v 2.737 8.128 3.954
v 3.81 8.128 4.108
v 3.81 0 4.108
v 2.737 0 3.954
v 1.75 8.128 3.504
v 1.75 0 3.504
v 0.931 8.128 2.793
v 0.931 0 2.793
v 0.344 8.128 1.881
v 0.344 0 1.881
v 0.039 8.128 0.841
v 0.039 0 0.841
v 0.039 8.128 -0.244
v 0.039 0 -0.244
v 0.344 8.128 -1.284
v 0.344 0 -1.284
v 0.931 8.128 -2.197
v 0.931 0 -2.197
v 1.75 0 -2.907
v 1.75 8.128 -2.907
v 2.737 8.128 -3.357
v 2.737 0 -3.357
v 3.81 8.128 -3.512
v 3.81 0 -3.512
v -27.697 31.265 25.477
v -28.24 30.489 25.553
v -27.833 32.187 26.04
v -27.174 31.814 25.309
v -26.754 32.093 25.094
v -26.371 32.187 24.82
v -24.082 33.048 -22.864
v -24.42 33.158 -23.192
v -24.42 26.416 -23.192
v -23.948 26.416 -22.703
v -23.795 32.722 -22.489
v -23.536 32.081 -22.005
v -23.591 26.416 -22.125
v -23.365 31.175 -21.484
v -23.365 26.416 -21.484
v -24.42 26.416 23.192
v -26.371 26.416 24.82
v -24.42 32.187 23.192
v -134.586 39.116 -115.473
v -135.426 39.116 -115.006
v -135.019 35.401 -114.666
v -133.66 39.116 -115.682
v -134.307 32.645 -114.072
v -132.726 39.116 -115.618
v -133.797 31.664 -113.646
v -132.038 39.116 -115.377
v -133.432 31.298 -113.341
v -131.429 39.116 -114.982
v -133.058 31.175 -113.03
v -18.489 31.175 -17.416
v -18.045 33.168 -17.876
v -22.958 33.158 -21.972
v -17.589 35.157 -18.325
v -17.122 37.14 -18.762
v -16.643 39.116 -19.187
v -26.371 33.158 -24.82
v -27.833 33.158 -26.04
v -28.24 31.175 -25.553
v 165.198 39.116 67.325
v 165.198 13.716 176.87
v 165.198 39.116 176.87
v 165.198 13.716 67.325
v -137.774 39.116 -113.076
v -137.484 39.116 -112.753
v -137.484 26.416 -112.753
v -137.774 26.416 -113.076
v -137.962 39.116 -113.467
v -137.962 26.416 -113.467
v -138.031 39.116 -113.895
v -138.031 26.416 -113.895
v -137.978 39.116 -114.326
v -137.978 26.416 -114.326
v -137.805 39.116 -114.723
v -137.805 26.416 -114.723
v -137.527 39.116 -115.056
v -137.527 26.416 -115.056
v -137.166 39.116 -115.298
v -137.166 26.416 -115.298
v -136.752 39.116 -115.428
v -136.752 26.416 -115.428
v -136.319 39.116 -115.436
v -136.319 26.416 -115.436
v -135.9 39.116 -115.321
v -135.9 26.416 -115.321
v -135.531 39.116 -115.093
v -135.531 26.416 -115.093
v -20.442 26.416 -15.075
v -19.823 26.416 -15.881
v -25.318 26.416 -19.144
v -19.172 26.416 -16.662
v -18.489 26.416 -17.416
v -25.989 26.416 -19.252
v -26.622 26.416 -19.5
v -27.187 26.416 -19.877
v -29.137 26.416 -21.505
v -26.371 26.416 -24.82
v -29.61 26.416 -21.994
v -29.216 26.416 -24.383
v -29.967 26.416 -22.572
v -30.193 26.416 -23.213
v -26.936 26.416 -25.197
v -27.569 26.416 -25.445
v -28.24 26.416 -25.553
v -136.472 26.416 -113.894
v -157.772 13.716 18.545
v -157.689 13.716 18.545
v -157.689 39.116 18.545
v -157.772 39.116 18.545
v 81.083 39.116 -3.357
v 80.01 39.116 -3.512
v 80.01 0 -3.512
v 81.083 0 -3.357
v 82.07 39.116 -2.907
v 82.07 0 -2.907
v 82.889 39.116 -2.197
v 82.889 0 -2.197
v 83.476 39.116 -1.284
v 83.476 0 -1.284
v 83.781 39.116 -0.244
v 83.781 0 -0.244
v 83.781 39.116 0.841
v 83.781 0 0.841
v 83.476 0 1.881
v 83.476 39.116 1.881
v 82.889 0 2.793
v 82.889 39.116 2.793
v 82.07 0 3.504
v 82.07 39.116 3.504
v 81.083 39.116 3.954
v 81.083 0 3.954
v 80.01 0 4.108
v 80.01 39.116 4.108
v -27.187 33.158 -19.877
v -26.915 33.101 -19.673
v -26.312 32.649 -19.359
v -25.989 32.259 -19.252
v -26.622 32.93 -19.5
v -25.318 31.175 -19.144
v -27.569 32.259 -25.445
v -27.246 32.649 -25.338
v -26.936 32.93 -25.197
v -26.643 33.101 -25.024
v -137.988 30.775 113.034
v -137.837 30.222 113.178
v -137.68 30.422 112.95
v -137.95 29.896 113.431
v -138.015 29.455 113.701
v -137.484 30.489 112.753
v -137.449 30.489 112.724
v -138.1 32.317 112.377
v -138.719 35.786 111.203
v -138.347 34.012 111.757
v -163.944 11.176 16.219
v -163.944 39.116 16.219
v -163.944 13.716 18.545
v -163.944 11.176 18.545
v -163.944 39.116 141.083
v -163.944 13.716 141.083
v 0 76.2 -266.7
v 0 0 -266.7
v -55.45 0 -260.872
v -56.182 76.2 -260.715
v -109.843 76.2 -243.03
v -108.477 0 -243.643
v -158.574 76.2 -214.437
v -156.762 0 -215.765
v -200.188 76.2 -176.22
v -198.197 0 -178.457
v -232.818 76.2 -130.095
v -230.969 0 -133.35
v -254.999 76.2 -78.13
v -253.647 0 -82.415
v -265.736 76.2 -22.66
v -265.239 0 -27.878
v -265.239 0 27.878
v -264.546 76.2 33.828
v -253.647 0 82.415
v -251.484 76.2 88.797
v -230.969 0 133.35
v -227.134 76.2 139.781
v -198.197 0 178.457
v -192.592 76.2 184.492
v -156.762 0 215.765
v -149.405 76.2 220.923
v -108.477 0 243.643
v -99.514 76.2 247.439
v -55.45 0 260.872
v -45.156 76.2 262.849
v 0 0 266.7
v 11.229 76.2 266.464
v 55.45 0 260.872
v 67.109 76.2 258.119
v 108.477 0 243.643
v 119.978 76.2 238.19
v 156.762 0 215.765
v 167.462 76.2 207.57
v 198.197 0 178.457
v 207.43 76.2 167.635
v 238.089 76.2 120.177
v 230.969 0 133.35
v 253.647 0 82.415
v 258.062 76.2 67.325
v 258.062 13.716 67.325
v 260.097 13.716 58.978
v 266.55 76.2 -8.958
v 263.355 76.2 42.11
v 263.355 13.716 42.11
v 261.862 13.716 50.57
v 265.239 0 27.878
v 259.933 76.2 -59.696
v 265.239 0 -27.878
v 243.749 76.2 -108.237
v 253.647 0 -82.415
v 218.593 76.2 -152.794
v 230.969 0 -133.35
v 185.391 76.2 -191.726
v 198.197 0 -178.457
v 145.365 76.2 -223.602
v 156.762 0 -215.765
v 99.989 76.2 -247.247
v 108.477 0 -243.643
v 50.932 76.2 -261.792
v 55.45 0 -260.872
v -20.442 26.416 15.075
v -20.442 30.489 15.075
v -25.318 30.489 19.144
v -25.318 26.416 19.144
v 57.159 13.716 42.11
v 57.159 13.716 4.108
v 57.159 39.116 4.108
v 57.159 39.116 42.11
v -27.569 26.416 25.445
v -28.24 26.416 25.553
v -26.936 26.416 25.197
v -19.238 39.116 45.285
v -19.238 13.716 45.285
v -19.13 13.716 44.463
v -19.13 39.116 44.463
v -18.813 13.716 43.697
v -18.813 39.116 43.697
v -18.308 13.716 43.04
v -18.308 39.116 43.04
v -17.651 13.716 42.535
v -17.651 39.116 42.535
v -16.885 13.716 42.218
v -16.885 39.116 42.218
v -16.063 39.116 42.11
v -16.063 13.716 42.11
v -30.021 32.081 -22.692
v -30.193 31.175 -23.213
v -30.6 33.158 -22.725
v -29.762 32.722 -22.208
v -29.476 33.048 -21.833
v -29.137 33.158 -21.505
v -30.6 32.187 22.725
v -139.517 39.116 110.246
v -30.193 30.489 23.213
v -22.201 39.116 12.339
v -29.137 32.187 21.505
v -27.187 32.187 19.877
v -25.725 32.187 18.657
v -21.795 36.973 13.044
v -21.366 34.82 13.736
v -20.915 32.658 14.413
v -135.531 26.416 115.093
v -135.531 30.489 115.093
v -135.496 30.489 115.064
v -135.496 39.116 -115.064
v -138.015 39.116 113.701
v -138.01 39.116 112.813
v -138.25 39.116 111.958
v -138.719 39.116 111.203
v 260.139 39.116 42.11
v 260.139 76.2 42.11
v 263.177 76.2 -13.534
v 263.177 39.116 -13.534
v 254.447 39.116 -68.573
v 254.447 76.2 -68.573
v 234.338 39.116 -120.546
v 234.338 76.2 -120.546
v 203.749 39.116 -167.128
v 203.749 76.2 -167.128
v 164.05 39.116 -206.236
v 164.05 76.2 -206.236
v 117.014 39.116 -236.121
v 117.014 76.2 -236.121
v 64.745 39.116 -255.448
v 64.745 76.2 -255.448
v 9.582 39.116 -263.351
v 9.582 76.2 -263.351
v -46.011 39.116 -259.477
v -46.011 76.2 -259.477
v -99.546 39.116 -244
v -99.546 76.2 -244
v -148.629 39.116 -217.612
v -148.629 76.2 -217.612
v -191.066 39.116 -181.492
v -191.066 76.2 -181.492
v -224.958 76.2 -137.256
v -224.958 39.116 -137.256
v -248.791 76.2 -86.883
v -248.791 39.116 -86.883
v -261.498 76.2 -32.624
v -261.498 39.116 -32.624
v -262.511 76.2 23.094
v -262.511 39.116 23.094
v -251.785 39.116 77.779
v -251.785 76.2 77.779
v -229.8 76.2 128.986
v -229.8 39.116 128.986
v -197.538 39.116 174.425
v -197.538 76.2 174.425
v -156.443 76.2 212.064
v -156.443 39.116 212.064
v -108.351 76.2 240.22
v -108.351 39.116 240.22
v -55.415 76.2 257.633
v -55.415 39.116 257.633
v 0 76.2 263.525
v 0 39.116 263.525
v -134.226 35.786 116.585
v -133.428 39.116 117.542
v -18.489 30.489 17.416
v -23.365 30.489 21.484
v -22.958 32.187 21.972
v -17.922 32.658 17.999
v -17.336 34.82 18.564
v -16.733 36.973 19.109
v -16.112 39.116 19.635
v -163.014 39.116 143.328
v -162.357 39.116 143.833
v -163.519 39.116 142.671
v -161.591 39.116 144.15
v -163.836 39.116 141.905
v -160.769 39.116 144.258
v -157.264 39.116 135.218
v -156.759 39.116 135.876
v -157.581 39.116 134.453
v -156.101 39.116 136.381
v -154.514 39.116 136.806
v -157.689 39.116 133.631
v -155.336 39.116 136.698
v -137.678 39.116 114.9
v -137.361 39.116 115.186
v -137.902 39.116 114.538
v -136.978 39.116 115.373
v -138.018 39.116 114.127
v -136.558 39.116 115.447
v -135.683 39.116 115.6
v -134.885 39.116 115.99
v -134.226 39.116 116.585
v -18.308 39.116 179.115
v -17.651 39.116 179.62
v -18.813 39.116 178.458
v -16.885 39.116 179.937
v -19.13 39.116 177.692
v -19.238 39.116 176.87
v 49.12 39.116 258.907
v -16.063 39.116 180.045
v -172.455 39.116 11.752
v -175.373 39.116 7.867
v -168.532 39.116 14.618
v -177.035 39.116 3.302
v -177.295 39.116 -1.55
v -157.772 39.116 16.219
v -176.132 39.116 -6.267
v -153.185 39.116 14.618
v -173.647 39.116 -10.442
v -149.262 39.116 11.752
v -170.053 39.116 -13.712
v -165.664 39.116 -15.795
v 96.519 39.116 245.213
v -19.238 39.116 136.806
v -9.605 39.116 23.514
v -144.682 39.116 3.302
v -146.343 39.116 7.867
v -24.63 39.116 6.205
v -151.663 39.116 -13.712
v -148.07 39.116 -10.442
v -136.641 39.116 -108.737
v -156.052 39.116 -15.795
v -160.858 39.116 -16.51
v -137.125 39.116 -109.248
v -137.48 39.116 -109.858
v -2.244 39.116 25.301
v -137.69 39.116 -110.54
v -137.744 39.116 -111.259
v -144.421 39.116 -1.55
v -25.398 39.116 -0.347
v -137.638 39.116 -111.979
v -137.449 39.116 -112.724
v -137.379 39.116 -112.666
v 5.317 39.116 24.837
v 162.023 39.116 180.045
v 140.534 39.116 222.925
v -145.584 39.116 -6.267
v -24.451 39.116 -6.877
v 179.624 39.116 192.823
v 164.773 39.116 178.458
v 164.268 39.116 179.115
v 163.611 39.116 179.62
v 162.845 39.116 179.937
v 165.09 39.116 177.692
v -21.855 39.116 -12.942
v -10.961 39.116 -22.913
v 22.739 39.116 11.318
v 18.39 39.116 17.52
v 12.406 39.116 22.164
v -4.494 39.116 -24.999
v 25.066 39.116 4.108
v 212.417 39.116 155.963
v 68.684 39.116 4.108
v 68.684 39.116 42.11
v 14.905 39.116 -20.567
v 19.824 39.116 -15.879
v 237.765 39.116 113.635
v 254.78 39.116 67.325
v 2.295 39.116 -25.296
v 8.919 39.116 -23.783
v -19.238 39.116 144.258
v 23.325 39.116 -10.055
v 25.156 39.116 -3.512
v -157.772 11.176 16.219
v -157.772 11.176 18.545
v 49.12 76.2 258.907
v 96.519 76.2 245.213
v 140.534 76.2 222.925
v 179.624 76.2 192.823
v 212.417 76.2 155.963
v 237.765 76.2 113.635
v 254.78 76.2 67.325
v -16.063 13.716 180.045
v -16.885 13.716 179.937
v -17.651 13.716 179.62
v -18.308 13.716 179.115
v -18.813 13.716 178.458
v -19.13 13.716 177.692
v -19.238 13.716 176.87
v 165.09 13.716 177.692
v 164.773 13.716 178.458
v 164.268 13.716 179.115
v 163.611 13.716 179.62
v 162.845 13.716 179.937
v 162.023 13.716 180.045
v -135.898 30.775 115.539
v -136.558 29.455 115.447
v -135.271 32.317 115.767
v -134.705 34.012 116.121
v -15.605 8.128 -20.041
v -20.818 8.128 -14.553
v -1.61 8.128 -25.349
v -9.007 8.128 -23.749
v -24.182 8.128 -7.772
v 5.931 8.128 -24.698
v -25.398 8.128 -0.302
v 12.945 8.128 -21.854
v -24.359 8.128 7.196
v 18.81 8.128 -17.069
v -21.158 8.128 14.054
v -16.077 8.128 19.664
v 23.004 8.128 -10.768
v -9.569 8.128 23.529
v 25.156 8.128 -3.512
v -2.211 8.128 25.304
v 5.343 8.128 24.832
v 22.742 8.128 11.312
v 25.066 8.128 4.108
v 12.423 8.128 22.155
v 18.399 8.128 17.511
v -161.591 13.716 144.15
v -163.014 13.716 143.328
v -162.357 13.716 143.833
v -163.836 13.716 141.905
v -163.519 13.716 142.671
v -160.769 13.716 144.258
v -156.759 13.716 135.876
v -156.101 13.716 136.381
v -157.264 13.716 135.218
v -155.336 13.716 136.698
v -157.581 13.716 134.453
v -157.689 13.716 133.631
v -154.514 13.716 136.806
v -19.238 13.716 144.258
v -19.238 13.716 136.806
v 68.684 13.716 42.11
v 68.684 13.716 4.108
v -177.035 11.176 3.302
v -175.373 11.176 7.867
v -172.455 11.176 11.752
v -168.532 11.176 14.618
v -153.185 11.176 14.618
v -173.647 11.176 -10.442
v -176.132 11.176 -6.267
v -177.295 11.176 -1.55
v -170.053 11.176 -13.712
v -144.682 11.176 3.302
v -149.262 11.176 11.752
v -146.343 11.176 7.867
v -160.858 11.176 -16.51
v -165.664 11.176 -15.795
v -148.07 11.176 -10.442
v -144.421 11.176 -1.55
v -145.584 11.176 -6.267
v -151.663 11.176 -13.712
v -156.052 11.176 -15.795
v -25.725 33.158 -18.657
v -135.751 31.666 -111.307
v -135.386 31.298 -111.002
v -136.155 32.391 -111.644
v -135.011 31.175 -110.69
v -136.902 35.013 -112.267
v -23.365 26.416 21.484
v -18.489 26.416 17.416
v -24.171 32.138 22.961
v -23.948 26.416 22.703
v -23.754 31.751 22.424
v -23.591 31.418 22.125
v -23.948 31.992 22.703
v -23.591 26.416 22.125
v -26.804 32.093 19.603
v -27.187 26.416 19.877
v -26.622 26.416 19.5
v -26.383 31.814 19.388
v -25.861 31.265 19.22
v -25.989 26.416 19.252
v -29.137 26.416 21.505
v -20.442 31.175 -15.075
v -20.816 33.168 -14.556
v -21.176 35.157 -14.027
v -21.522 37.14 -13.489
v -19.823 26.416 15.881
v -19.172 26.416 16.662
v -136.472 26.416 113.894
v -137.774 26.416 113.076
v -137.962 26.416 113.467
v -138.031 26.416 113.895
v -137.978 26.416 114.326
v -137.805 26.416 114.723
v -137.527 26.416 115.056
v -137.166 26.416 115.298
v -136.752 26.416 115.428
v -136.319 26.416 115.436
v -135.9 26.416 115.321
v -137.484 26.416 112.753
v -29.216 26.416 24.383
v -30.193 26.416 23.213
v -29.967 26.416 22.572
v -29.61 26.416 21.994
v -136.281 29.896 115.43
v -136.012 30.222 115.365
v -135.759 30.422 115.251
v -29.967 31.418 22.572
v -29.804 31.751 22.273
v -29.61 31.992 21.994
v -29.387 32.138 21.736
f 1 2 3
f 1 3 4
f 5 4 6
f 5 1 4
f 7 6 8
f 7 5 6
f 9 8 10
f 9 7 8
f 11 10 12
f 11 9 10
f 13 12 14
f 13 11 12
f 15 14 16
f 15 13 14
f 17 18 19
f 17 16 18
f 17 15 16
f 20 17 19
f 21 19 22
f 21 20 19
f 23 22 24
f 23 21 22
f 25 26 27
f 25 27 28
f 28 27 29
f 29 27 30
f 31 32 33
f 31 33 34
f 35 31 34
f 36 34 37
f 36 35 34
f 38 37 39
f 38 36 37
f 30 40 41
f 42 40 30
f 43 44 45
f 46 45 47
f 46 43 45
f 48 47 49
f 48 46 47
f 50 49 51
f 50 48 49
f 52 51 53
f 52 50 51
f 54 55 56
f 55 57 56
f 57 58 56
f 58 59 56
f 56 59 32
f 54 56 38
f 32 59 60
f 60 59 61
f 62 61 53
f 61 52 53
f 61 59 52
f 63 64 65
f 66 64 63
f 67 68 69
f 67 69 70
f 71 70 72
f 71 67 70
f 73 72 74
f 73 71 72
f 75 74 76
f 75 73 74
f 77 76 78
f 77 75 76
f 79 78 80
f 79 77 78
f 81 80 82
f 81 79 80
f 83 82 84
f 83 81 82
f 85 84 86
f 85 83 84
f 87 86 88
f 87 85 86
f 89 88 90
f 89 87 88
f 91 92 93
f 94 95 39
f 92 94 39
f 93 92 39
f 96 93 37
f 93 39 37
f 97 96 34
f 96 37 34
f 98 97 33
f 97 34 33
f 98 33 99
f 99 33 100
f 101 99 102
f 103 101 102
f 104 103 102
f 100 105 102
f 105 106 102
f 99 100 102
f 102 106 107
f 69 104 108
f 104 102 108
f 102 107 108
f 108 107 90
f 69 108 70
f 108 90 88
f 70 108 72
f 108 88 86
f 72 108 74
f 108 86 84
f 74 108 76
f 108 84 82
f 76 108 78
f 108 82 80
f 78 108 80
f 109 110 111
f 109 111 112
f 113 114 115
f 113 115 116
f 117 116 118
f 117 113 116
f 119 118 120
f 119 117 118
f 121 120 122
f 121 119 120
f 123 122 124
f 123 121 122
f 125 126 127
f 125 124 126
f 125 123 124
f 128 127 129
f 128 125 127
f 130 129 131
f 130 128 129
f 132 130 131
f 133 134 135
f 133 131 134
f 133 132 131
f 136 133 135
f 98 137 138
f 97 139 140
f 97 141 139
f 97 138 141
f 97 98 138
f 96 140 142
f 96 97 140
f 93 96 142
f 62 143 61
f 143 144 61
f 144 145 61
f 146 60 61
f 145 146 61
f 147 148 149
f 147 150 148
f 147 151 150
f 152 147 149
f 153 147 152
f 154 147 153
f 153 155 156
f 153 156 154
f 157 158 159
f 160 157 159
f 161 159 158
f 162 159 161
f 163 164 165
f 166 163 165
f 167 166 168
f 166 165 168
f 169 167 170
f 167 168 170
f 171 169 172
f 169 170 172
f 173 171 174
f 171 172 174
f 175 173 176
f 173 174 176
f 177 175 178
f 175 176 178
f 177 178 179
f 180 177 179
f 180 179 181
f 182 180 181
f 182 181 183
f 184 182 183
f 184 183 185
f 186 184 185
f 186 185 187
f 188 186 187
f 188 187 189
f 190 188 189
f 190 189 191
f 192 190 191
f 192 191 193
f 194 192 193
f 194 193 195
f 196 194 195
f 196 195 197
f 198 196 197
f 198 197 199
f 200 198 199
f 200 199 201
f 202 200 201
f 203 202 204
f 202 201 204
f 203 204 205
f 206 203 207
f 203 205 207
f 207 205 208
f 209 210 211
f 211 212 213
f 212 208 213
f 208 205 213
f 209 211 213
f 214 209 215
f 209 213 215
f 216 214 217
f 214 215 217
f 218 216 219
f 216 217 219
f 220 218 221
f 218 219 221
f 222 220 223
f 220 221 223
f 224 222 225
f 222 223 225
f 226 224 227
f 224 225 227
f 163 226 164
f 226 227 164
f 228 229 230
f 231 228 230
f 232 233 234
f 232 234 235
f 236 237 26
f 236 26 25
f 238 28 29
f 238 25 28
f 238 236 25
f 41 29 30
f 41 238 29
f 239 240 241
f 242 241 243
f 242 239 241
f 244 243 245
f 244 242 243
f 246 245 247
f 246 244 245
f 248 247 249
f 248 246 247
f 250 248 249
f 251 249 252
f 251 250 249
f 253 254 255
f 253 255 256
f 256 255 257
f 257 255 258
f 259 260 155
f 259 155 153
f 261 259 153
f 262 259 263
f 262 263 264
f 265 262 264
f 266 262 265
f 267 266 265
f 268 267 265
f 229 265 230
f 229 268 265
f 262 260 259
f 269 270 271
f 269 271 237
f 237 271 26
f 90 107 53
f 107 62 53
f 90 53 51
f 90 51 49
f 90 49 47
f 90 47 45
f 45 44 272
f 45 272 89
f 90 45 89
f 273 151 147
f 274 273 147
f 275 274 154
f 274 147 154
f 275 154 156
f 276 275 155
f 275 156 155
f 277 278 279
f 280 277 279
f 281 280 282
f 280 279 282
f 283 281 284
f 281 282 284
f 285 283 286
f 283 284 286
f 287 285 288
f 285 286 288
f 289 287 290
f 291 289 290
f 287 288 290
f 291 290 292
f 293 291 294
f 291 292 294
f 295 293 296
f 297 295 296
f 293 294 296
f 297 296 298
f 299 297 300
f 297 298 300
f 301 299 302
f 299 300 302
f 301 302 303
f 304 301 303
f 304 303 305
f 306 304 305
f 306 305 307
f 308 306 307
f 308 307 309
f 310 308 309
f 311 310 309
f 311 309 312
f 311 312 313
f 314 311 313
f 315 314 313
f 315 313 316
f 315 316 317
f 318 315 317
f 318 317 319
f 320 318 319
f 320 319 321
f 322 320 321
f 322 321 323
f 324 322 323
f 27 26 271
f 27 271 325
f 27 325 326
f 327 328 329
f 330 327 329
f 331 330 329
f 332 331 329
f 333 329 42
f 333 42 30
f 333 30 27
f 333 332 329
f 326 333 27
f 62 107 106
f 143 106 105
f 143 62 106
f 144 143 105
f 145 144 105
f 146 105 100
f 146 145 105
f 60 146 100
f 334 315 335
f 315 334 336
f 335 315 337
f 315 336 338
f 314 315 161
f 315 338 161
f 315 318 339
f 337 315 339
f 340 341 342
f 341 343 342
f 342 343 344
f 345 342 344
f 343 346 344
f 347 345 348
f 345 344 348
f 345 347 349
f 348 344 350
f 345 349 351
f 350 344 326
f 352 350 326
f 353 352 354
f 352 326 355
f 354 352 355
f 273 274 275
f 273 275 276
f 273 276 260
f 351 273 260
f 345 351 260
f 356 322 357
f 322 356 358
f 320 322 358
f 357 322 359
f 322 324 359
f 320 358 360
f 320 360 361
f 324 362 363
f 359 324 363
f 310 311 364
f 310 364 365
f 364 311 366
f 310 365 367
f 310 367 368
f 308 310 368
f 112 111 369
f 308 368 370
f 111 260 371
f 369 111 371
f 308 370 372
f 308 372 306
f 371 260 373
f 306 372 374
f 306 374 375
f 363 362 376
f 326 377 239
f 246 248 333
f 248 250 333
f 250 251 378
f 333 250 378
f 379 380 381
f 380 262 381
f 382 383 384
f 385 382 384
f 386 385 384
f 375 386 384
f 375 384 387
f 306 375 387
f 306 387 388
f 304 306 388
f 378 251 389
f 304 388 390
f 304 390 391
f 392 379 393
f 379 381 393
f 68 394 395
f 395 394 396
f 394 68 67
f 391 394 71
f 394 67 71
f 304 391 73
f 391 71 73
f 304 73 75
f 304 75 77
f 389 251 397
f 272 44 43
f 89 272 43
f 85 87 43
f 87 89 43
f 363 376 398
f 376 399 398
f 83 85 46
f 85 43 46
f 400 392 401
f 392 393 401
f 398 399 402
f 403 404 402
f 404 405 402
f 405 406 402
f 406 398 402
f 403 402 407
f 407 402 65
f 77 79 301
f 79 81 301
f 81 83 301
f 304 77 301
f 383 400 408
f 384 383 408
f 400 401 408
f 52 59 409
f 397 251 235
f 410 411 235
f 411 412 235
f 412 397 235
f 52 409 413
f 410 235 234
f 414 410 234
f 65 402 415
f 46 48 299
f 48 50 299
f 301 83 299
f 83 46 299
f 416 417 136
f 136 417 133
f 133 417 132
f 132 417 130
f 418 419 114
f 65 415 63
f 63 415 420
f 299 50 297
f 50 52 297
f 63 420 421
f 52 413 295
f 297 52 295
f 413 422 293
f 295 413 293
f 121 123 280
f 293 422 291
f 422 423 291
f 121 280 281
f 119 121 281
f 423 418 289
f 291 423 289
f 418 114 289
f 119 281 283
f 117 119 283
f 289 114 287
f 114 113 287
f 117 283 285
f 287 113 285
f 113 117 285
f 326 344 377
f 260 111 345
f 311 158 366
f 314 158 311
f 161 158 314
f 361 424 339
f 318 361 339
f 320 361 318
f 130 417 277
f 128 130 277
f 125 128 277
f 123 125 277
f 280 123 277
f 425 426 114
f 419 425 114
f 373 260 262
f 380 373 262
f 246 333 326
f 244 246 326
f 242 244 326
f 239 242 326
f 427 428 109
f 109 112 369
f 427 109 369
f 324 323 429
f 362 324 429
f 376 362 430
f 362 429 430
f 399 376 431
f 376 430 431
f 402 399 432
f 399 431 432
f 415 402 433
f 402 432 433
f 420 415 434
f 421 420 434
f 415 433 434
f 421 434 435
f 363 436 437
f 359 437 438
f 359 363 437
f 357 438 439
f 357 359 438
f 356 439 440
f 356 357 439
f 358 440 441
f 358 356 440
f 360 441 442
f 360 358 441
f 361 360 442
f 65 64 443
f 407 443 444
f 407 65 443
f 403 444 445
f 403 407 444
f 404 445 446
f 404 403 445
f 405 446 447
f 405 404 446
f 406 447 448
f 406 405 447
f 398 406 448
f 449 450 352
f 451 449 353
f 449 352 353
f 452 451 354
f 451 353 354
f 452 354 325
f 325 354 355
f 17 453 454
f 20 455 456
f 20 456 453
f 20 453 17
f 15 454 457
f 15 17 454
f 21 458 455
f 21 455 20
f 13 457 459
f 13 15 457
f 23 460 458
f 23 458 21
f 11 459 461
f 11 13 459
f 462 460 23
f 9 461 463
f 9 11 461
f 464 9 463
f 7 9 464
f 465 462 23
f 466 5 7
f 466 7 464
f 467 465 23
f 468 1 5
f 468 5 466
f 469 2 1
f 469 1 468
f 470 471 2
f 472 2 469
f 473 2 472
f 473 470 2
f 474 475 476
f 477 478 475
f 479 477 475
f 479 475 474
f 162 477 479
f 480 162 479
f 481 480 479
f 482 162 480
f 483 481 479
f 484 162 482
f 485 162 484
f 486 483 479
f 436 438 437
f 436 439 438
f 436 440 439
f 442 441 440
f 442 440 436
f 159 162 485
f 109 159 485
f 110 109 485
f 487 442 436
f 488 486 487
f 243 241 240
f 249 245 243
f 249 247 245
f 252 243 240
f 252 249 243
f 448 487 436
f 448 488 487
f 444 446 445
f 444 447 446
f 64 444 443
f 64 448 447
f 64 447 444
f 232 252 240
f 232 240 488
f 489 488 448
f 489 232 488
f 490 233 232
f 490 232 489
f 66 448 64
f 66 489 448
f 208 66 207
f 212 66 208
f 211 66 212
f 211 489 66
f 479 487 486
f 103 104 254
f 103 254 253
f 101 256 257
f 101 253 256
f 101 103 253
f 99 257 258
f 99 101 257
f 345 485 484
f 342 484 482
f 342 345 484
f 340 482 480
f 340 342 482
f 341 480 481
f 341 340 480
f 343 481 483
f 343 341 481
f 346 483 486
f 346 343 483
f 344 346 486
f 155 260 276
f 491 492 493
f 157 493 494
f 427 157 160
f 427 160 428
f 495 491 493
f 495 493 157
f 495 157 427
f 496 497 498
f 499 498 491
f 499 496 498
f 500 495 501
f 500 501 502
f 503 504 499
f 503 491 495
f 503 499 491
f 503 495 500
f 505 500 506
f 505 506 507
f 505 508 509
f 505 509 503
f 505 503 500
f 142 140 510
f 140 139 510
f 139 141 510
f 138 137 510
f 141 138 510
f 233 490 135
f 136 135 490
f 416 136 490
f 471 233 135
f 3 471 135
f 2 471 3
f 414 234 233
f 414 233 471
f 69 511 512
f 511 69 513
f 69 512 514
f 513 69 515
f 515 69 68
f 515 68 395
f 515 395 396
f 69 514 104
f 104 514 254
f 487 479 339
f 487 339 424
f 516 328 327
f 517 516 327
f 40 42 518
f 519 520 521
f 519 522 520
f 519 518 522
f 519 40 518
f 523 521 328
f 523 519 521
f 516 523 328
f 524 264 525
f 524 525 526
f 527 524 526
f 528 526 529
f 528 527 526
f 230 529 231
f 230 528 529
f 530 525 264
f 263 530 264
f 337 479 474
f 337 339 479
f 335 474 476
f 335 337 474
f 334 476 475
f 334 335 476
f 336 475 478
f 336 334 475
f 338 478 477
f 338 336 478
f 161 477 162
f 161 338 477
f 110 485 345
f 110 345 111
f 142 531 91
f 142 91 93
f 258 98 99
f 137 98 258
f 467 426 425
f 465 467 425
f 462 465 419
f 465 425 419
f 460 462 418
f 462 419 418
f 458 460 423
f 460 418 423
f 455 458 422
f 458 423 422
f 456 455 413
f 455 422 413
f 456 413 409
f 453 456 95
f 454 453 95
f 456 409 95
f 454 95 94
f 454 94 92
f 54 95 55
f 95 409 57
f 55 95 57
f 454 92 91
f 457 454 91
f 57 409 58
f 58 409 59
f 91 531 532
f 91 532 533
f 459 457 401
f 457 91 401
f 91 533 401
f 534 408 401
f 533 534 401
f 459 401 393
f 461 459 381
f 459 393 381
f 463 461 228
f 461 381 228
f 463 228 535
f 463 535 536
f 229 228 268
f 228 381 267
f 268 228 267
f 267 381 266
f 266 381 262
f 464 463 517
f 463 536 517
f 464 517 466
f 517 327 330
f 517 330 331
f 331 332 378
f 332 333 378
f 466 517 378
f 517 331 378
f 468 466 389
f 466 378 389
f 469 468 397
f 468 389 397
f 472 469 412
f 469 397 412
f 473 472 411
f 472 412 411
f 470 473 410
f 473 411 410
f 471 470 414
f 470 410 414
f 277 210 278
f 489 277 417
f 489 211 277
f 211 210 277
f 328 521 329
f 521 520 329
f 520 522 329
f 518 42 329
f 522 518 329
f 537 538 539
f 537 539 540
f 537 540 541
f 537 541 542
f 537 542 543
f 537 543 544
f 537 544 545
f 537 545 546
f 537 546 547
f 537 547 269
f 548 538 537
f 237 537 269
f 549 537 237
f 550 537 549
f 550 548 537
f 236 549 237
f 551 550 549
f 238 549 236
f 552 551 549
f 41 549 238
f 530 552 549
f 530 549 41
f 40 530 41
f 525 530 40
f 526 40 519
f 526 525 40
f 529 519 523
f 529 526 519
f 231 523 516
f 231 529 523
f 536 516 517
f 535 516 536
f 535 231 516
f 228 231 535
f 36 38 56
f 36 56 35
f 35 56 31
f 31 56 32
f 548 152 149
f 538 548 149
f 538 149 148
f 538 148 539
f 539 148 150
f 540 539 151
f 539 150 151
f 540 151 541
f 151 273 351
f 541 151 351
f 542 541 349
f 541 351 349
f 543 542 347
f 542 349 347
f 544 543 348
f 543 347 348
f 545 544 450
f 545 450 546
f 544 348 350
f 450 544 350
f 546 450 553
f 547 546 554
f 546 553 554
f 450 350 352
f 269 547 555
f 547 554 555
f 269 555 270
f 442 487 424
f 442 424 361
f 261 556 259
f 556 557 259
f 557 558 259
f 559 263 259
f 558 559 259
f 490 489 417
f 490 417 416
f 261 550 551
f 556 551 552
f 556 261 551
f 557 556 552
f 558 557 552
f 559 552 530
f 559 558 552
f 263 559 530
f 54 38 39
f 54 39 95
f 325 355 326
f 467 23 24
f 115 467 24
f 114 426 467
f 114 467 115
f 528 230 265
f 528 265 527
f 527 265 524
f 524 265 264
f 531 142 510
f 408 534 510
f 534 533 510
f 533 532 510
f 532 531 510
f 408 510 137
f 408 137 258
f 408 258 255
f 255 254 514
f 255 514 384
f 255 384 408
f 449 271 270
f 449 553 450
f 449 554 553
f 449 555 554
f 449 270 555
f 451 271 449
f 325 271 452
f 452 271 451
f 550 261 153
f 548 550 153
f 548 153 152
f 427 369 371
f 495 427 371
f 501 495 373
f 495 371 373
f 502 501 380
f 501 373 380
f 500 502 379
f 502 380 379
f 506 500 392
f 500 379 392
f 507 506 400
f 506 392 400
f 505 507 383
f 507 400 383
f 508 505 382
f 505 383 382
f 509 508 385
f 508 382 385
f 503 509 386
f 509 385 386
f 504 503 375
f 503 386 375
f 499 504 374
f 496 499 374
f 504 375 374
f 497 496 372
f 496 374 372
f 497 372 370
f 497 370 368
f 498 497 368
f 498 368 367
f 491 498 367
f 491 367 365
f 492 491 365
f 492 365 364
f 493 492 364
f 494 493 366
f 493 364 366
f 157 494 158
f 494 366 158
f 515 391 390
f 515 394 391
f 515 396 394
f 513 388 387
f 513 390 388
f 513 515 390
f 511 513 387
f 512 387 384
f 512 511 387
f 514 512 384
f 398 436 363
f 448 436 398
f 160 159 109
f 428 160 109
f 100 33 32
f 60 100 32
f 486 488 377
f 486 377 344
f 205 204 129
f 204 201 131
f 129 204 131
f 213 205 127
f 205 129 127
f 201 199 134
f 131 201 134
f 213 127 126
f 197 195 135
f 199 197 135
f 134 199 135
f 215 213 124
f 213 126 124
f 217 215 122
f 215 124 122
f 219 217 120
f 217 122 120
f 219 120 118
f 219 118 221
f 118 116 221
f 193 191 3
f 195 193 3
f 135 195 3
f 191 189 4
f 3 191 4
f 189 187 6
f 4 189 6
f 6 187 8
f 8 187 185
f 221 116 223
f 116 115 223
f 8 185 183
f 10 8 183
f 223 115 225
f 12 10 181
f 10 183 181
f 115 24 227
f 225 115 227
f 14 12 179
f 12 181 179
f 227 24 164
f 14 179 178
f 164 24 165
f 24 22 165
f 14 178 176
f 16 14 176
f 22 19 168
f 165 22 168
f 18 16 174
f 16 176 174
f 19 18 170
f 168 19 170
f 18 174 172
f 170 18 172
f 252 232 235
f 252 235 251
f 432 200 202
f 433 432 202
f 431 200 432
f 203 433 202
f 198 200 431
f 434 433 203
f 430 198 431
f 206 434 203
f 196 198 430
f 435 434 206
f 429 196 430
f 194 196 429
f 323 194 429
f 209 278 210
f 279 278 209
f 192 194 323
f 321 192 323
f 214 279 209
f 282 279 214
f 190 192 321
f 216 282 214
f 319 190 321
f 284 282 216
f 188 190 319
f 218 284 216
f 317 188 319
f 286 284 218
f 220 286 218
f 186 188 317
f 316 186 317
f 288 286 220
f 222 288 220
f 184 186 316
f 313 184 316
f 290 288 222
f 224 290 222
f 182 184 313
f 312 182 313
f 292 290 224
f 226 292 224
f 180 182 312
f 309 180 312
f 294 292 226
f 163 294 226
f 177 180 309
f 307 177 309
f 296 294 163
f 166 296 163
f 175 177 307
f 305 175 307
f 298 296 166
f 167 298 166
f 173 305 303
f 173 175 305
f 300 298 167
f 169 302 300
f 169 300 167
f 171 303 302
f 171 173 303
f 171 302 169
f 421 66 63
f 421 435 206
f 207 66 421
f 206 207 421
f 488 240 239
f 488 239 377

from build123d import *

# Parameters (mm, degrees)
SKETCH1_R                = 266.7
BOSS_EXTRUDE1_DEPTH      = 76.2
SKETCH2_R                = 263.525
CUT_EXTRUDE1_DEPTH       = 37.084
SKETCH3_R                = 25.4
CUT_EXTRUDE2_DEPTH       = 30.988
CUT_EXTRUDE3_DEPTH       = 380.193672753
CUT_EXTRUDE4_DEPTH       = 12.7
CUT_EXTRUDE5_DEPTH       = 6.35
CUT_EXTRUDE5_DEPTH_BACK  = 152.4
CUT_EXTRUDE6_DEPTH       = 152.4
CUT_EXTRUDE6_DEPTH_BACK  = 6.35
SKETCH12_W               = 4.318
SKETCH12_H               = 15.080276974
CUT_EXTRUDE10_DEPTH      = 6.35
SKETCH14_W               = 4.318
SKETCH14_H               = 12.7
CUT_EXTRUDE11_DEPTH      = 6.35
CUT_EXTRUDE12_DEPTH      = 27.94
FILLET3_R                = 3.175
FILLET4_R                = 3.175
FILLET5_R                = 3.175
FILLET6_R                = 3.175
CUT_EXTRUDE13_DEPTH      = 380.193672753
CUT_EXTRUDE13_DEPTH_BACK = 25.4
FILLET8_R                = 3.175


with BuildPart() as part:
    # Sketch1 → Boss-Extrude1 (new body)
    with BuildSketch(Plane(origin=(0, 0, 0), x_dir=(1, 0, 0), z_dir=(0, 1, 0))):
        with Locations(Location((0, 0, 0), (0, 0, 90))):
            Circle(SKETCH1_R)
    extrude(amount=BOSS_EXTRUDE1_DEPTH)

    # Sketch2 → Cut-Extrude1 (cut)
    with BuildSketch(Plane(origin=(0, 76.2, 0), x_dir=(1, 0, 0), z_dir=(0, 1, 0))):
        with Locations(Location((0, 0, 0), (0, 0, 270))):
            Circle(SKETCH2_R)
    extrude(amount=-CUT_EXTRUDE1_DEPTH, mode=Mode.SUBTRACT)

    # Sketch3 → Cut-Extrude2 (cut)
    with BuildSketch(Plane(origin=(0, 39.116, 0), x_dir=(1, 0, 0), z_dir=(0, 1, 0))):
        with Locations(Location((0, 0, 0), (0, 0, 270))):
            Circle(SKETCH3_R)
    extrude(amount=-CUT_EXTRUDE2_DEPTH, mode=Mode.SUBTRACT)

    # Sketch4 → Cut-Extrude3 (cut, through all)
    with BuildSketch(Plane(origin=(0, 39.116, 0), x_dir=(1, 0, 0), z_dir=(0, 1, 0))):
        with BuildLine():
            Line((3.81, 3.511669421), (80.01, 3.511669421))
            ThreePointArc((80.01, 3.511669421), (83.82, -0.298330579), (80.01, -4.108330579))
            Line((80.01, -4.108330579), (3.81, -4.108330579))
            ThreePointArc((3.81, -4.108330579), (0, -0.298330579), (3.81, 3.511669421))
        make_face()
    extrude(amount=-CUT_EXTRUDE3_DEPTH, mode=Mode.SUBTRACT)

    # Sketch5 → Cut-Extrude4 (cut)
    with BuildSketch(Plane(origin=(0, 39.116, 0), x_dir=(1, 0, 0), z_dir=(0, 1, 0))):
        with BuildLine():
            ThreePointArc((-18.489457636, -17.415509074), (-19.50107715, -16.274765436), (-20.442429489, -15.075379816))
            Line((-20.442429489, -15.075379816), (-137.484025976, -112.753293422))
            ThreePointArc((-137.484025976, -112.753293422), (-137.677604679, -114.899843977), (-135.531054124, -115.09342268))
            Line((-135.531054124, -115.09342268), (-18.489457636, -17.415509074))
        make_face()
        with BuildLine():
            Line((-0.976485926, -1.170064629), (-137.484025976, 112.753293422))
            ThreePointArc((-137.484025976, 112.753293422), (-137.677604679, 114.899843977), (-135.531054124, 115.09342268))
            Line((-135.531054124, 115.09342268), (0.976485926, 1.170064629))
            ThreePointArc((0.976485926, 1.170064629), (1.170064629, -0.976485926), (-0.976485926, -1.170064629))
        make_face()
    extrude(amount=-CUT_EXTRUDE4_DEPTH, mode=Mode.SUBTRACT)

    # Sketch6 → Cut-Extrude5 (cut, two sides: drawn at the far end of the back side and taken through both)
    with BuildSketch(Plane(origin=(-19.465943562, 0, -16.245444445), x_dir=(0.6407387966858445, 0, -0.7677589429121461), z_dir=(0.7677589429121461, 0, 0.6407387966858445)).offset(-CUT_EXTRUDE5_DEPTH_BACK)):
        Polygon((0, 26.416), (-4.067147417, 39.116), (4.067147417, 39.116), align=None)
    extrude(amount=CUT_EXTRUDE5_DEPTH + CUT_EXTRUDE5_DEPTH_BACK, mode=Mode.SUBTRACT)

    # Sketch11 → Cut-Extrude6 (cut, two sides: drawn at the far end of the back side and taken through both)
    with BuildSketch(Plane(origin=(-19.465943562, 0, 16.245444445), x_dir=(0.6407387966858473, 0, 0.7677589429121437), z_dir=(-0.7677589429121437, 0, 0.6407387966858473)).offset(-CUT_EXTRUDE6_DEPTH_BACK)):
        Polygon((0, 26.416), (4.751467106, 39.116), (-4.751467106, 39.116), align=None)
    extrude(amount=CUT_EXTRUDE6_DEPTH + CUT_EXTRUDE6_DEPTH_BACK, mode=Mode.SUBTRACT)

    # Sketch12 → Cut-Extrude10 (cut)
    with BuildSketch(Plane(origin=(-24.34121285, 0, 20.314135804), x_dir=(0.6407387966858473, 0, 0.7677589429121437), z_dir=(-0.7677589429121437, 0, 0.6407387966858473))):
        with Locations((0, 33.956138487)):
            Rectangle(SKETCH12_W, SKETCH12_H)
    extrude(amount=CUT_EXTRUDE10_DEPTH, mode=Mode.SUBTRACT)

    # Sketch14 → Cut-Extrude11 (cut)
    with BuildSketch(Plane(origin=(-24.34121285, 0, -20.314135804), x_dir=(0.6407387966858445, 0, -0.7677589429121461), z_dir=(0.7677589429121461, 0, 0.6407387966858445))):
        with Locations((0, 32.766)):
            Rectangle(SKETCH14_W, SKETCH14_H)
    extrude(amount=-CUT_EXTRUDE11_DEPTH, mode=Mode.SUBTRACT)

    # Sketch15 → Cut-Extrude12 (cut)
    with BuildSketch(Plane(origin=(0, 39.116, 0), x_dir=(1, 0, 0), z_dir=(0, 1, 0))):
        with BuildLine():
            Line((-163.944291355, -16.219005523), (-163.944291355, -18.54493052))
            Line((-163.944291355, -18.54493052), (-157.772108645, -18.54493052))
            Line((-157.772108645, -18.54493052), (-157.772108645, -16.219005523))
            ThreePointArc((-157.772108645, -16.219005523), (-160.8582, 16.51), (-163.944291355, -16.219005523))
        make_face()
    extrude(amount=-CUT_EXTRUDE12_DEPTH, mode=Mode.SUBTRACT)

    # Fillet3
    # the kernel refuses this fillet: 3.175 mm, written as the material it adds along each edge
    with BuildSketch(Plane(origin=(-22.957857788, 37.920153839, -21.971727362), x_dir=(-0.7677589429121467, 0, -0.6407387966858438), z_dir=(0, -1, 0))) as fillet3_piece_1_section:
        with BuildLine():
            CenterArc((1.905, -3.175), FILLET3_R, 90, 36.869897646)
            Line((0, -0.635), (-0.0381, -0.5842))
            ThreePointArc((-0.0381, -0.5842), (-0.0635, -0.3175), (-0.0635, 0))
            Line((-0.0635, 0), (0, 0.0635))
            Line((0, 0.0635), (1.905, 0.0635))
            Line((1.905, 0.0635), (1.905, 0))
        make_face()
    fillet3_piece_1 = extrude(amount=16.266653839, mode=Mode.PRIVATE)
    fillet3_piece_1 = split(fillet3_piece_1, bisect_by=Plane(origin=(-24.062062875, 29.877521432, -21.52503997), z_dir=(0.6102111889180302, -0.3049898163702348, -0.731179538027217)), keep=Keep.TOP, mode=Mode.PRIVATE)
    add(fillet3_piece_1)

    # Fillet4
    # the kernel refuses this fillet: 3.175 mm, written as the material it adds along each edge
    with BuildSketch(Plane(origin=(-27.833127075, 21.6535, 26.040418721), x_dir=(-0.640738796685741, 0, -0.7677589429122325), z_dir=(0, 1, 0))) as fillet4_piece_1_section:
        with BuildLine():
            CenterArc((3.175, -1.905), FILLET4_R, 143.130102354, 36.869897646)
            Line((0, -1.905), (-0.0635, -1.905))
            Line((-0.0635, -1.905), (-0.0635, 0))
            Line((-0.0635, 0), (0, 0.0635))
            ThreePointArc((0, 0.0635), (0.3175, 0.0635), (0.5842, 0.0381))
            Line((0.5842, 0.0381), (0.635, 0))
        make_face()
    fillet4_piece_1 = extrude(amount=15.295701846, mode=Mode.PRIVATE)
    fillet4_piece_1 = split(fillet4_piece_1, bisect_by=Plane(origin=(-29.144428623, 24.988566888, 23.627101883), z_dir=(0.6001136551613587, -0.35041000177300097, 0.7190802678048671)), keep=Keep.TOP, mode=Mode.PRIVATE)
    add(fillet4_piece_1)
    with BuildSketch(Plane(origin=(-30.599837199, 36.949201846, 22.725235606), x_dir=(0.7677589429121437, 0, -0.6407387966858474), z_dir=(0, -1, 0))) as fillet4_piece_2_section:
        with BuildLine():
            CenterArc((1.905, 3.175), FILLET4_R, 233.130102354, 36.869897646)
            Line((0, 0.635), (-0.0381, 0.5842))
            ThreePointArc((-0.0381, 0.5842), (-0.0635, 0.3175), (-0.0635, 0))
            Line((-0.0635, 0), (0, -0.0635))
            Line((0, -0.0635), (1.905, -0.0635))
            Line((1.905, -0.0635), (1.905, 0))
        make_face()
    fillet4_piece_2 = extrude(amount=15.295701846, mode=Mode.PRIVATE)
    fillet4_piece_2 = split(fillet4_piece_2, bisect_by=Plane(origin=(-29.514976804, 29.459680247, 23.148743411), z_dir=(-0.6001136551613584, -0.3504100017730014, -0.7190802678048671)), keep=Keep.TOP, mode=Mode.PRIVATE)
    add(fillet4_piece_2)
    with BuildSketch(Plane(origin=(-25.724567912, 36.949201846, 18.656544247), x_dir=(0.6407387966857708, 0, 0.7677589429122077), z_dir=(0, -1, 0))) as fillet4_piece_3_section:
        with BuildLine():
            CenterArc((3.175, 1.905), FILLET4_R, 180, 36.869897646)
            Line((0, 1.905), (-0.0635, 1.905))
            Line((-0.0635, 1.905), (-0.0635, 0))
            Line((-0.0635, 0), (0, -0.0635))
            ThreePointArc((0, -0.0635), (0.3175, -0.0635), (0.5842, -0.0381))
            Line((0.5842, -0.0381), (0.635, 0))
        make_face()
    fillet4_piece_3 = extrude(amount=15.295701846, mode=Mode.PRIVATE)
    fillet4_piece_3 = split(fillet4_piece_3, bisect_by=Plane(origin=(-25.501982789, 29.459680247, 19.799670137), z_dir=(-0.6001136551613584, -0.3504100017730014, -0.7190802678048671)), keep=Keep.TOP, mode=Mode.PRIVATE)
    add(fillet4_piece_3)
    with BuildSketch(Plane(origin=(-22.957857788, 21.6535, 21.971727362), x_dir=(-0.767758942912144, 0, 0.640738796685847), z_dir=(0, 1, 0))) as fillet4_piece_4_section:
        with BuildLine():
            CenterArc((1.905, -3.175), FILLET4_R, 90, 36.869897646)
            Line((0, -0.635), (-0.0381, -0.5842))
            ThreePointArc((-0.0381, -0.5842), (-0.0635, -0.3175), (-0.0635, 0))
            Line((-0.0635, 0), (0, 0.0635))
            Line((0, 0.0635), (1.905, 0.0635))
            Line((1.905, 0.0635), (1.905, 0))
        make_face()
    fillet4_piece_4 = extrude(amount=15.295701846, mode=Mode.PRIVATE)
    fillet4_piece_4 = split(fillet4_piece_4, bisect_by=Plane(origin=(-25.09763609, 24.988566888, 20.249821811), z_dir=(0.6001136551613587, -0.35041000177300097, 0.7190802678048671)), keep=Keep.TOP, mode=Mode.PRIVATE)
    add(fillet4_piece_4)
    with BuildSketch(Plane(origin=(-30.599837199, 21.6535, -22.725235606), x_dir=(0.6407387966859301, 0, -0.7677589429120746), z_dir=(0, 1, 0))) as fillet4_piece_5_section:
        with BuildLine():
            CenterArc((3.175, -1.905), FILLET4_R, 143.130102354, 36.869897646)
            Line((0, -1.905), (-0.0635, -1.905))
            Line((-0.0635, -1.905), (-0.0635, 0))
            Line((-0.0635, 0), (0, 0.0635))
            ThreePointArc((0, 0.0635), (0.3175, 0.0635), (0.5842, 0.0381))
            Line((0.5842, 0.0381), (0.635, 0))
        make_face()
    fillet4_piece_5 = extrude(amount=16.266653839, mode=Mode.PRIVATE)
    fillet4_piece_5 = split(fillet4_piece_5, bisect_by=Plane(origin=(-28.479191191, 24.841632974, -24.424216075), z_dir=(-0.6102111889180335, -0.30498981637021927, 0.7311795380272208)), keep=Keep.TOP, mode=Mode.PRIVATE)
    add(fillet4_piece_5)
    with BuildSketch(Plane(origin=(-27.833127075, 37.920153839, -26.040418721), x_dir=(0.767758942912146, 0, 0.6407387966858447), z_dir=(0, -1, 0))) as fillet4_piece_6_section:
        with BuildLine():
            CenterArc((1.905, 3.175), FILLET4_R, 233.130102354, 36.869897646)
            Line((0, 0.635), (-0.0381, 0.5842))
            ThreePointArc((-0.0381, 0.5842), (-0.0635, 0.3175), (-0.0635, 0))
            Line((-0.0635, 0), (0, -0.0635))
            Line((0, -0.0635), (1.905, -0.0635))
            Line((1.905, -0.0635), (1.905, 0))
        make_face()
    fillet4_piece_6 = extrude(amount=16.266653839, mode=Mode.PRIVATE)
    fillet4_piece_6 = split(fillet4_piece_6, bisect_by=Plane(origin=(-28.075056891, 29.877521432, -24.874113244), z_dir=(0.6102111889181517, -0.30498981637007594, -0.731179538027182)), keep=Keep.TOP, mode=Mode.PRIVATE)
    add(fillet4_piece_6)
    with BuildSketch(Plane(origin=(-25.724567912, 21.6535, -18.656544247), x_dir=(-0.7677589429121459, 0, -0.6407387966858448), z_dir=(0, 1, 0))) as fillet4_piece_7_section:
        with BuildLine():
            CenterArc((1.905, -3.175), FILLET4_R, 90, 36.869897646)
            Line((0, -0.635), (-0.0381, -0.5842))
            ThreePointArc((-0.0381, -0.5842), (-0.0635, -0.3175), (-0.0635, 0))
            Line((-0.0635, 0), (0, 0.0635))
            Line((0, 0.0635), (1.905, 0.0635))
            Line((1.905, 0.0635), (1.905, 0))
        make_face()
    fillet4_piece_7 = extrude(amount=16.266653839, mode=Mode.PRIVATE)
    fillet4_piece_7 = split(fillet4_piece_7, bisect_by=Plane(origin=(-24.432398658, 24.841632974, -21.046936002), z_dir=(-0.6102111889180335, -0.30498981637021927, 0.7311795380272208)), keep=Keep.TOP, mode=Mode.PRIVATE)
    add(fillet4_piece_7)

    # Fillet5
    # the kernel refuses this fillet: 3.175 mm, written as the material it adds along each edge
    with BuildSketch(Plane(origin=(-132.315290532, 46.675322671, -118.875260218), x_dir=(0.7677589429120775, 3.430744963368742e-14, 0.6407387966859268), z_dir=(-0.19541880794250094, -0.9523556121063447, 0.23415865901538102))) as fillet5_piece_1_section:
        with BuildLine():
            CenterArc((FILLET5_R, FILLET5_R), FILLET5_R, 180, 90)
            Line((0, FILLET5_R), (0, 0))
            Line((0, 0), (FILLET5_R, 0))
        make_face()
    fillet5_piece_1 = extrude(amount=24.213466665, mode=Mode.PRIVATE)
    fillet5_piece_1 = split(fillet5_piece_1, bisect_by=Plane(origin=(-134.161464886, 39.116, -115.294765638), z_dir=(0, -1, 0)), keep=Keep.TOP, mode=Mode.PRIVATE)
    fillet5_piece_1 = split(fillet5_piece_1, bisect_by=Plane(origin=(-134.822791784, 35.893084099, -114.502337205), z_dir=(0.6407387966858452, 0, -0.7677589429121455)), keep=Keep.TOP, mode=Mode.PRIVATE)
    add(fillet5_piece_1)
    with BuildSketch(Plane(origin=(-132.315290532, 46.675322671, -118.875260218), x_dir=(0.7677589429120775, 3.430744963368742e-14, 0.6407387966859268), z_dir=(-0.19541880794250094, -0.9523556121063447, 0.23415865901538102))) as fillet5_piece_2_section:
        with BuildLine():
            CenterArc((FILLET5_R, FILLET5_R), FILLET5_R, 180, 90)
            Line((0, FILLET5_R), (0, 0))
            Line((0, 0), (FILLET5_R, 0))
        make_face()
    fillet5_piece_2 = extrude(amount=24.213466665, mode=Mode.PRIVATE)
    fillet5_piece_2 = split(fillet5_piece_2, bisect_by=Plane(origin=(-137.32634275, 25.904168976, -112.621697741), z_dir=(-0.640738796685845, 0, 0.7677589429121457)), keep=Keep.TOP, mode=Mode.PRIVATE)
    add(fillet5_piece_2)
    with BuildSketch(Plane(origin=(-135.8977556, 23.615491804, -114.582606787), x_dir=(0.7677589429121472, 0, 0.6407387966858433), z_dir=(-0.19541880794249095, 0.9523556121063497, 0.23415865901536906))) as fillet5_piece_3_section:
        with BuildLine():
            CenterArc((FILLET5_R, FILLET5_R), FILLET5_R, 180, 90)
            Line((0, FILLET5_R), (0, 0))
            Line((0, 0), (FILLET5_R, 0))
        make_face()
    fillet5_piece_3 = extrude(amount=24.213466665, mode=Mode.PRIVATE)
    fillet5_piece_3 = split(fillet5_piece_3, bisect_by=Plane(origin=(-135.373370898, 25.904168977, -114.961826999), z_dir=(0.6407387966858452, 0, -0.7677589429121455)), keep=Keep.TOP, mode=Mode.PRIVATE)
    add(fillet5_piece_3)
    with BuildSketch(Plane(origin=(-135.8977556, 23.615491804, -114.582606787), x_dir=(0.7677589429121472, 0, 0.6407387966858433), z_dir=(-0.19541880794249095, 0.9523556121063497, 0.23415865901536906))) as fillet5_piece_4_section:
        with BuildLine():
            CenterArc((FILLET5_R, FILLET5_R), FILLET5_R, 180, 90)
            Line((0, FILLET5_R), (0, 0))
            Line((0, 0), (FILLET5_R, 0))
        make_face()
    fillet5_piece_4 = extrude(amount=24.213466665, mode=Mode.PRIVATE)
    fillet5_piece_4 = split(fillet5_piece_4, bisect_by=Plane(origin=(-137.437090535, 39.116, -111.369779514), z_dir=(0, -1, 0)), keep=Keep.TOP, mode=Mode.PRIVATE)
    fillet5_piece_4 = split(fillet5_piece_4, bisect_by=Plane(origin=(-136.775763636, 35.893084099, -112.162207947), z_dir=(-0.640738796685845, 0, 0.7677589429121457)), keep=Keep.TOP, mode=Mode.PRIVATE)
    add(fillet5_piece_4)

    # Fillet6
    # the kernel refuses this fillet: 3.175 mm, written as the material it takes off along each edge
    with BuildSketch(Plane(origin=(-135.495920536, 44.069726972, 115.064101689), x_dir=(-0.9408962833877623, 0, 0.3386948241516185), z_dir=(0, -1, 0))) as fillet6_piece_1_section:
        with BuildLine():
            CenterArc((2.303263748, -2.949899465), FILLET6_R, 111.704706858, 48.245736997)
            Line((-0.67931998, -1.861405413), (-0.977578353, -1.752556008))
            Line((-0.977578353, -1.752556008), (-0.298258373, 0.108849405))
            Line((-0.298258373, 0.108849405), (0.108849405, 0.298258373))
            ThreePointArc((0.108849405, 0.298258373), (0.151837335, 0.282569926), (1.011656626, 0.294989946))
            Line((1.011656626, 0.294989946), (1.129075455, 0))
        make_face()
    fillet6_piece_1 = extrude(amount=18.534017348, mode=Mode.PRIVATE)
    fillet6_piece_1 = split(fillet6_piece_1, bisect_by=Plane(origin=(-134.042471425, 37.040108879, 117.043277716), z_dir=(-0.6001136551613587, 0.3504100017730009, -0.7190802678048671)), keep=Keep.TOP, mode=Mode.PRIVATE)
    add(fillet6_piece_1, mode=Mode.SUBTRACT)
    with BuildSketch(Plane(origin=(-137.448892388, 25.535709624, 112.723972431), x_dir=(-0.6407387966858429, 0, -0.7677589429121475), z_dir=(0, 1, 0))) as fillet6_piece_2_section:
        with BuildLine():
            CenterArc((1.981490789, 3.175), FILLET6_R, 221.754263003, 48.245736997)
            Line((-0.387084068, 1.060649474), (-0.623941554, 0.849214422))
            ThreePointArc((-0.623941554, 0.849214422), (-0.3175, 0.045761222), (-0.3175, 0))
            Line((-0.3175, 0), (0, -0.3175))
            Line((0, -0.3175), (1.981490789, -0.3175))
            Line((1.981490789, -0.3175), (1.981490789, 0))
        make_face()
    fillet6_piece_2 = extrude(amount=18.534017348, mode=Mode.PRIVATE)
    fillet6_piece_2 = split(fillet6_piece_2, bisect_by=Plane(origin=(-139.136103081, 37.040108879, 110.939883828), z_dir=(0.6001136551610721, 0.3504100017730421, 0.7190802678050863)), keep=Keep.TOP, mode=Mode.PRIVATE)
    add(fillet6_piece_2, mode=Mode.SUBTRACT)

    # Sketch18 → Cut-Extrude13 (cut, two sides: drawn at the far end of the back side and taken through both)
    with BuildSketch(Plane(origin=(0, 39.116, 0), x_dir=(1, 0, 0), z_dir=(0, 1, 0)).offset(-CUT_EXTRUDE13_DEPTH_BACK)):
        Polygon((-19.238275413, -180.045164459), (165.198234521, -180.045164459), (165.198234521, -67.325222668), (267.08562237, -67.325222668), (267.08562237, -42.109873745), (165.198234521, -42.109873745), (68.68395137, -42.109873745), (68.68395137, -4.108330579), (57.159387951, -4.108330579), (57.159387951, -42.109873745), (-19.238275413, -42.109873745), (-19.238275413, -136.80596573), (-157.688900722, -136.80596573), (-157.688900722, -18.54493052), (-163.944291355, -18.54493052), (-163.944291355, -144.258110226), (-157.688900722, -144.258110226), (-19.238275413, -144.258110226), align=None)
    extrude(amount=CUT_EXTRUDE13_DEPTH + CUT_EXTRUDE13_DEPTH_BACK, mode=Mode.SUBTRACT)

    # Fillet8
    fillet8_edges = [part.edges().sort_by_distance(p)[0] for p in [
        (-19.238275413, 26.416, 180.045164459),
        (165.198234521, 26.416, 180.045164459),
        (-19.238275413, 26.416, 42.109873745),
        (-157.688900722, 26.416, 136.80596573),
        (-163.944291355, 26.416, 144.258110226),
    ]]
    fillet(fillet8_edges, radius=FILLET8_R)


solid = part.part
